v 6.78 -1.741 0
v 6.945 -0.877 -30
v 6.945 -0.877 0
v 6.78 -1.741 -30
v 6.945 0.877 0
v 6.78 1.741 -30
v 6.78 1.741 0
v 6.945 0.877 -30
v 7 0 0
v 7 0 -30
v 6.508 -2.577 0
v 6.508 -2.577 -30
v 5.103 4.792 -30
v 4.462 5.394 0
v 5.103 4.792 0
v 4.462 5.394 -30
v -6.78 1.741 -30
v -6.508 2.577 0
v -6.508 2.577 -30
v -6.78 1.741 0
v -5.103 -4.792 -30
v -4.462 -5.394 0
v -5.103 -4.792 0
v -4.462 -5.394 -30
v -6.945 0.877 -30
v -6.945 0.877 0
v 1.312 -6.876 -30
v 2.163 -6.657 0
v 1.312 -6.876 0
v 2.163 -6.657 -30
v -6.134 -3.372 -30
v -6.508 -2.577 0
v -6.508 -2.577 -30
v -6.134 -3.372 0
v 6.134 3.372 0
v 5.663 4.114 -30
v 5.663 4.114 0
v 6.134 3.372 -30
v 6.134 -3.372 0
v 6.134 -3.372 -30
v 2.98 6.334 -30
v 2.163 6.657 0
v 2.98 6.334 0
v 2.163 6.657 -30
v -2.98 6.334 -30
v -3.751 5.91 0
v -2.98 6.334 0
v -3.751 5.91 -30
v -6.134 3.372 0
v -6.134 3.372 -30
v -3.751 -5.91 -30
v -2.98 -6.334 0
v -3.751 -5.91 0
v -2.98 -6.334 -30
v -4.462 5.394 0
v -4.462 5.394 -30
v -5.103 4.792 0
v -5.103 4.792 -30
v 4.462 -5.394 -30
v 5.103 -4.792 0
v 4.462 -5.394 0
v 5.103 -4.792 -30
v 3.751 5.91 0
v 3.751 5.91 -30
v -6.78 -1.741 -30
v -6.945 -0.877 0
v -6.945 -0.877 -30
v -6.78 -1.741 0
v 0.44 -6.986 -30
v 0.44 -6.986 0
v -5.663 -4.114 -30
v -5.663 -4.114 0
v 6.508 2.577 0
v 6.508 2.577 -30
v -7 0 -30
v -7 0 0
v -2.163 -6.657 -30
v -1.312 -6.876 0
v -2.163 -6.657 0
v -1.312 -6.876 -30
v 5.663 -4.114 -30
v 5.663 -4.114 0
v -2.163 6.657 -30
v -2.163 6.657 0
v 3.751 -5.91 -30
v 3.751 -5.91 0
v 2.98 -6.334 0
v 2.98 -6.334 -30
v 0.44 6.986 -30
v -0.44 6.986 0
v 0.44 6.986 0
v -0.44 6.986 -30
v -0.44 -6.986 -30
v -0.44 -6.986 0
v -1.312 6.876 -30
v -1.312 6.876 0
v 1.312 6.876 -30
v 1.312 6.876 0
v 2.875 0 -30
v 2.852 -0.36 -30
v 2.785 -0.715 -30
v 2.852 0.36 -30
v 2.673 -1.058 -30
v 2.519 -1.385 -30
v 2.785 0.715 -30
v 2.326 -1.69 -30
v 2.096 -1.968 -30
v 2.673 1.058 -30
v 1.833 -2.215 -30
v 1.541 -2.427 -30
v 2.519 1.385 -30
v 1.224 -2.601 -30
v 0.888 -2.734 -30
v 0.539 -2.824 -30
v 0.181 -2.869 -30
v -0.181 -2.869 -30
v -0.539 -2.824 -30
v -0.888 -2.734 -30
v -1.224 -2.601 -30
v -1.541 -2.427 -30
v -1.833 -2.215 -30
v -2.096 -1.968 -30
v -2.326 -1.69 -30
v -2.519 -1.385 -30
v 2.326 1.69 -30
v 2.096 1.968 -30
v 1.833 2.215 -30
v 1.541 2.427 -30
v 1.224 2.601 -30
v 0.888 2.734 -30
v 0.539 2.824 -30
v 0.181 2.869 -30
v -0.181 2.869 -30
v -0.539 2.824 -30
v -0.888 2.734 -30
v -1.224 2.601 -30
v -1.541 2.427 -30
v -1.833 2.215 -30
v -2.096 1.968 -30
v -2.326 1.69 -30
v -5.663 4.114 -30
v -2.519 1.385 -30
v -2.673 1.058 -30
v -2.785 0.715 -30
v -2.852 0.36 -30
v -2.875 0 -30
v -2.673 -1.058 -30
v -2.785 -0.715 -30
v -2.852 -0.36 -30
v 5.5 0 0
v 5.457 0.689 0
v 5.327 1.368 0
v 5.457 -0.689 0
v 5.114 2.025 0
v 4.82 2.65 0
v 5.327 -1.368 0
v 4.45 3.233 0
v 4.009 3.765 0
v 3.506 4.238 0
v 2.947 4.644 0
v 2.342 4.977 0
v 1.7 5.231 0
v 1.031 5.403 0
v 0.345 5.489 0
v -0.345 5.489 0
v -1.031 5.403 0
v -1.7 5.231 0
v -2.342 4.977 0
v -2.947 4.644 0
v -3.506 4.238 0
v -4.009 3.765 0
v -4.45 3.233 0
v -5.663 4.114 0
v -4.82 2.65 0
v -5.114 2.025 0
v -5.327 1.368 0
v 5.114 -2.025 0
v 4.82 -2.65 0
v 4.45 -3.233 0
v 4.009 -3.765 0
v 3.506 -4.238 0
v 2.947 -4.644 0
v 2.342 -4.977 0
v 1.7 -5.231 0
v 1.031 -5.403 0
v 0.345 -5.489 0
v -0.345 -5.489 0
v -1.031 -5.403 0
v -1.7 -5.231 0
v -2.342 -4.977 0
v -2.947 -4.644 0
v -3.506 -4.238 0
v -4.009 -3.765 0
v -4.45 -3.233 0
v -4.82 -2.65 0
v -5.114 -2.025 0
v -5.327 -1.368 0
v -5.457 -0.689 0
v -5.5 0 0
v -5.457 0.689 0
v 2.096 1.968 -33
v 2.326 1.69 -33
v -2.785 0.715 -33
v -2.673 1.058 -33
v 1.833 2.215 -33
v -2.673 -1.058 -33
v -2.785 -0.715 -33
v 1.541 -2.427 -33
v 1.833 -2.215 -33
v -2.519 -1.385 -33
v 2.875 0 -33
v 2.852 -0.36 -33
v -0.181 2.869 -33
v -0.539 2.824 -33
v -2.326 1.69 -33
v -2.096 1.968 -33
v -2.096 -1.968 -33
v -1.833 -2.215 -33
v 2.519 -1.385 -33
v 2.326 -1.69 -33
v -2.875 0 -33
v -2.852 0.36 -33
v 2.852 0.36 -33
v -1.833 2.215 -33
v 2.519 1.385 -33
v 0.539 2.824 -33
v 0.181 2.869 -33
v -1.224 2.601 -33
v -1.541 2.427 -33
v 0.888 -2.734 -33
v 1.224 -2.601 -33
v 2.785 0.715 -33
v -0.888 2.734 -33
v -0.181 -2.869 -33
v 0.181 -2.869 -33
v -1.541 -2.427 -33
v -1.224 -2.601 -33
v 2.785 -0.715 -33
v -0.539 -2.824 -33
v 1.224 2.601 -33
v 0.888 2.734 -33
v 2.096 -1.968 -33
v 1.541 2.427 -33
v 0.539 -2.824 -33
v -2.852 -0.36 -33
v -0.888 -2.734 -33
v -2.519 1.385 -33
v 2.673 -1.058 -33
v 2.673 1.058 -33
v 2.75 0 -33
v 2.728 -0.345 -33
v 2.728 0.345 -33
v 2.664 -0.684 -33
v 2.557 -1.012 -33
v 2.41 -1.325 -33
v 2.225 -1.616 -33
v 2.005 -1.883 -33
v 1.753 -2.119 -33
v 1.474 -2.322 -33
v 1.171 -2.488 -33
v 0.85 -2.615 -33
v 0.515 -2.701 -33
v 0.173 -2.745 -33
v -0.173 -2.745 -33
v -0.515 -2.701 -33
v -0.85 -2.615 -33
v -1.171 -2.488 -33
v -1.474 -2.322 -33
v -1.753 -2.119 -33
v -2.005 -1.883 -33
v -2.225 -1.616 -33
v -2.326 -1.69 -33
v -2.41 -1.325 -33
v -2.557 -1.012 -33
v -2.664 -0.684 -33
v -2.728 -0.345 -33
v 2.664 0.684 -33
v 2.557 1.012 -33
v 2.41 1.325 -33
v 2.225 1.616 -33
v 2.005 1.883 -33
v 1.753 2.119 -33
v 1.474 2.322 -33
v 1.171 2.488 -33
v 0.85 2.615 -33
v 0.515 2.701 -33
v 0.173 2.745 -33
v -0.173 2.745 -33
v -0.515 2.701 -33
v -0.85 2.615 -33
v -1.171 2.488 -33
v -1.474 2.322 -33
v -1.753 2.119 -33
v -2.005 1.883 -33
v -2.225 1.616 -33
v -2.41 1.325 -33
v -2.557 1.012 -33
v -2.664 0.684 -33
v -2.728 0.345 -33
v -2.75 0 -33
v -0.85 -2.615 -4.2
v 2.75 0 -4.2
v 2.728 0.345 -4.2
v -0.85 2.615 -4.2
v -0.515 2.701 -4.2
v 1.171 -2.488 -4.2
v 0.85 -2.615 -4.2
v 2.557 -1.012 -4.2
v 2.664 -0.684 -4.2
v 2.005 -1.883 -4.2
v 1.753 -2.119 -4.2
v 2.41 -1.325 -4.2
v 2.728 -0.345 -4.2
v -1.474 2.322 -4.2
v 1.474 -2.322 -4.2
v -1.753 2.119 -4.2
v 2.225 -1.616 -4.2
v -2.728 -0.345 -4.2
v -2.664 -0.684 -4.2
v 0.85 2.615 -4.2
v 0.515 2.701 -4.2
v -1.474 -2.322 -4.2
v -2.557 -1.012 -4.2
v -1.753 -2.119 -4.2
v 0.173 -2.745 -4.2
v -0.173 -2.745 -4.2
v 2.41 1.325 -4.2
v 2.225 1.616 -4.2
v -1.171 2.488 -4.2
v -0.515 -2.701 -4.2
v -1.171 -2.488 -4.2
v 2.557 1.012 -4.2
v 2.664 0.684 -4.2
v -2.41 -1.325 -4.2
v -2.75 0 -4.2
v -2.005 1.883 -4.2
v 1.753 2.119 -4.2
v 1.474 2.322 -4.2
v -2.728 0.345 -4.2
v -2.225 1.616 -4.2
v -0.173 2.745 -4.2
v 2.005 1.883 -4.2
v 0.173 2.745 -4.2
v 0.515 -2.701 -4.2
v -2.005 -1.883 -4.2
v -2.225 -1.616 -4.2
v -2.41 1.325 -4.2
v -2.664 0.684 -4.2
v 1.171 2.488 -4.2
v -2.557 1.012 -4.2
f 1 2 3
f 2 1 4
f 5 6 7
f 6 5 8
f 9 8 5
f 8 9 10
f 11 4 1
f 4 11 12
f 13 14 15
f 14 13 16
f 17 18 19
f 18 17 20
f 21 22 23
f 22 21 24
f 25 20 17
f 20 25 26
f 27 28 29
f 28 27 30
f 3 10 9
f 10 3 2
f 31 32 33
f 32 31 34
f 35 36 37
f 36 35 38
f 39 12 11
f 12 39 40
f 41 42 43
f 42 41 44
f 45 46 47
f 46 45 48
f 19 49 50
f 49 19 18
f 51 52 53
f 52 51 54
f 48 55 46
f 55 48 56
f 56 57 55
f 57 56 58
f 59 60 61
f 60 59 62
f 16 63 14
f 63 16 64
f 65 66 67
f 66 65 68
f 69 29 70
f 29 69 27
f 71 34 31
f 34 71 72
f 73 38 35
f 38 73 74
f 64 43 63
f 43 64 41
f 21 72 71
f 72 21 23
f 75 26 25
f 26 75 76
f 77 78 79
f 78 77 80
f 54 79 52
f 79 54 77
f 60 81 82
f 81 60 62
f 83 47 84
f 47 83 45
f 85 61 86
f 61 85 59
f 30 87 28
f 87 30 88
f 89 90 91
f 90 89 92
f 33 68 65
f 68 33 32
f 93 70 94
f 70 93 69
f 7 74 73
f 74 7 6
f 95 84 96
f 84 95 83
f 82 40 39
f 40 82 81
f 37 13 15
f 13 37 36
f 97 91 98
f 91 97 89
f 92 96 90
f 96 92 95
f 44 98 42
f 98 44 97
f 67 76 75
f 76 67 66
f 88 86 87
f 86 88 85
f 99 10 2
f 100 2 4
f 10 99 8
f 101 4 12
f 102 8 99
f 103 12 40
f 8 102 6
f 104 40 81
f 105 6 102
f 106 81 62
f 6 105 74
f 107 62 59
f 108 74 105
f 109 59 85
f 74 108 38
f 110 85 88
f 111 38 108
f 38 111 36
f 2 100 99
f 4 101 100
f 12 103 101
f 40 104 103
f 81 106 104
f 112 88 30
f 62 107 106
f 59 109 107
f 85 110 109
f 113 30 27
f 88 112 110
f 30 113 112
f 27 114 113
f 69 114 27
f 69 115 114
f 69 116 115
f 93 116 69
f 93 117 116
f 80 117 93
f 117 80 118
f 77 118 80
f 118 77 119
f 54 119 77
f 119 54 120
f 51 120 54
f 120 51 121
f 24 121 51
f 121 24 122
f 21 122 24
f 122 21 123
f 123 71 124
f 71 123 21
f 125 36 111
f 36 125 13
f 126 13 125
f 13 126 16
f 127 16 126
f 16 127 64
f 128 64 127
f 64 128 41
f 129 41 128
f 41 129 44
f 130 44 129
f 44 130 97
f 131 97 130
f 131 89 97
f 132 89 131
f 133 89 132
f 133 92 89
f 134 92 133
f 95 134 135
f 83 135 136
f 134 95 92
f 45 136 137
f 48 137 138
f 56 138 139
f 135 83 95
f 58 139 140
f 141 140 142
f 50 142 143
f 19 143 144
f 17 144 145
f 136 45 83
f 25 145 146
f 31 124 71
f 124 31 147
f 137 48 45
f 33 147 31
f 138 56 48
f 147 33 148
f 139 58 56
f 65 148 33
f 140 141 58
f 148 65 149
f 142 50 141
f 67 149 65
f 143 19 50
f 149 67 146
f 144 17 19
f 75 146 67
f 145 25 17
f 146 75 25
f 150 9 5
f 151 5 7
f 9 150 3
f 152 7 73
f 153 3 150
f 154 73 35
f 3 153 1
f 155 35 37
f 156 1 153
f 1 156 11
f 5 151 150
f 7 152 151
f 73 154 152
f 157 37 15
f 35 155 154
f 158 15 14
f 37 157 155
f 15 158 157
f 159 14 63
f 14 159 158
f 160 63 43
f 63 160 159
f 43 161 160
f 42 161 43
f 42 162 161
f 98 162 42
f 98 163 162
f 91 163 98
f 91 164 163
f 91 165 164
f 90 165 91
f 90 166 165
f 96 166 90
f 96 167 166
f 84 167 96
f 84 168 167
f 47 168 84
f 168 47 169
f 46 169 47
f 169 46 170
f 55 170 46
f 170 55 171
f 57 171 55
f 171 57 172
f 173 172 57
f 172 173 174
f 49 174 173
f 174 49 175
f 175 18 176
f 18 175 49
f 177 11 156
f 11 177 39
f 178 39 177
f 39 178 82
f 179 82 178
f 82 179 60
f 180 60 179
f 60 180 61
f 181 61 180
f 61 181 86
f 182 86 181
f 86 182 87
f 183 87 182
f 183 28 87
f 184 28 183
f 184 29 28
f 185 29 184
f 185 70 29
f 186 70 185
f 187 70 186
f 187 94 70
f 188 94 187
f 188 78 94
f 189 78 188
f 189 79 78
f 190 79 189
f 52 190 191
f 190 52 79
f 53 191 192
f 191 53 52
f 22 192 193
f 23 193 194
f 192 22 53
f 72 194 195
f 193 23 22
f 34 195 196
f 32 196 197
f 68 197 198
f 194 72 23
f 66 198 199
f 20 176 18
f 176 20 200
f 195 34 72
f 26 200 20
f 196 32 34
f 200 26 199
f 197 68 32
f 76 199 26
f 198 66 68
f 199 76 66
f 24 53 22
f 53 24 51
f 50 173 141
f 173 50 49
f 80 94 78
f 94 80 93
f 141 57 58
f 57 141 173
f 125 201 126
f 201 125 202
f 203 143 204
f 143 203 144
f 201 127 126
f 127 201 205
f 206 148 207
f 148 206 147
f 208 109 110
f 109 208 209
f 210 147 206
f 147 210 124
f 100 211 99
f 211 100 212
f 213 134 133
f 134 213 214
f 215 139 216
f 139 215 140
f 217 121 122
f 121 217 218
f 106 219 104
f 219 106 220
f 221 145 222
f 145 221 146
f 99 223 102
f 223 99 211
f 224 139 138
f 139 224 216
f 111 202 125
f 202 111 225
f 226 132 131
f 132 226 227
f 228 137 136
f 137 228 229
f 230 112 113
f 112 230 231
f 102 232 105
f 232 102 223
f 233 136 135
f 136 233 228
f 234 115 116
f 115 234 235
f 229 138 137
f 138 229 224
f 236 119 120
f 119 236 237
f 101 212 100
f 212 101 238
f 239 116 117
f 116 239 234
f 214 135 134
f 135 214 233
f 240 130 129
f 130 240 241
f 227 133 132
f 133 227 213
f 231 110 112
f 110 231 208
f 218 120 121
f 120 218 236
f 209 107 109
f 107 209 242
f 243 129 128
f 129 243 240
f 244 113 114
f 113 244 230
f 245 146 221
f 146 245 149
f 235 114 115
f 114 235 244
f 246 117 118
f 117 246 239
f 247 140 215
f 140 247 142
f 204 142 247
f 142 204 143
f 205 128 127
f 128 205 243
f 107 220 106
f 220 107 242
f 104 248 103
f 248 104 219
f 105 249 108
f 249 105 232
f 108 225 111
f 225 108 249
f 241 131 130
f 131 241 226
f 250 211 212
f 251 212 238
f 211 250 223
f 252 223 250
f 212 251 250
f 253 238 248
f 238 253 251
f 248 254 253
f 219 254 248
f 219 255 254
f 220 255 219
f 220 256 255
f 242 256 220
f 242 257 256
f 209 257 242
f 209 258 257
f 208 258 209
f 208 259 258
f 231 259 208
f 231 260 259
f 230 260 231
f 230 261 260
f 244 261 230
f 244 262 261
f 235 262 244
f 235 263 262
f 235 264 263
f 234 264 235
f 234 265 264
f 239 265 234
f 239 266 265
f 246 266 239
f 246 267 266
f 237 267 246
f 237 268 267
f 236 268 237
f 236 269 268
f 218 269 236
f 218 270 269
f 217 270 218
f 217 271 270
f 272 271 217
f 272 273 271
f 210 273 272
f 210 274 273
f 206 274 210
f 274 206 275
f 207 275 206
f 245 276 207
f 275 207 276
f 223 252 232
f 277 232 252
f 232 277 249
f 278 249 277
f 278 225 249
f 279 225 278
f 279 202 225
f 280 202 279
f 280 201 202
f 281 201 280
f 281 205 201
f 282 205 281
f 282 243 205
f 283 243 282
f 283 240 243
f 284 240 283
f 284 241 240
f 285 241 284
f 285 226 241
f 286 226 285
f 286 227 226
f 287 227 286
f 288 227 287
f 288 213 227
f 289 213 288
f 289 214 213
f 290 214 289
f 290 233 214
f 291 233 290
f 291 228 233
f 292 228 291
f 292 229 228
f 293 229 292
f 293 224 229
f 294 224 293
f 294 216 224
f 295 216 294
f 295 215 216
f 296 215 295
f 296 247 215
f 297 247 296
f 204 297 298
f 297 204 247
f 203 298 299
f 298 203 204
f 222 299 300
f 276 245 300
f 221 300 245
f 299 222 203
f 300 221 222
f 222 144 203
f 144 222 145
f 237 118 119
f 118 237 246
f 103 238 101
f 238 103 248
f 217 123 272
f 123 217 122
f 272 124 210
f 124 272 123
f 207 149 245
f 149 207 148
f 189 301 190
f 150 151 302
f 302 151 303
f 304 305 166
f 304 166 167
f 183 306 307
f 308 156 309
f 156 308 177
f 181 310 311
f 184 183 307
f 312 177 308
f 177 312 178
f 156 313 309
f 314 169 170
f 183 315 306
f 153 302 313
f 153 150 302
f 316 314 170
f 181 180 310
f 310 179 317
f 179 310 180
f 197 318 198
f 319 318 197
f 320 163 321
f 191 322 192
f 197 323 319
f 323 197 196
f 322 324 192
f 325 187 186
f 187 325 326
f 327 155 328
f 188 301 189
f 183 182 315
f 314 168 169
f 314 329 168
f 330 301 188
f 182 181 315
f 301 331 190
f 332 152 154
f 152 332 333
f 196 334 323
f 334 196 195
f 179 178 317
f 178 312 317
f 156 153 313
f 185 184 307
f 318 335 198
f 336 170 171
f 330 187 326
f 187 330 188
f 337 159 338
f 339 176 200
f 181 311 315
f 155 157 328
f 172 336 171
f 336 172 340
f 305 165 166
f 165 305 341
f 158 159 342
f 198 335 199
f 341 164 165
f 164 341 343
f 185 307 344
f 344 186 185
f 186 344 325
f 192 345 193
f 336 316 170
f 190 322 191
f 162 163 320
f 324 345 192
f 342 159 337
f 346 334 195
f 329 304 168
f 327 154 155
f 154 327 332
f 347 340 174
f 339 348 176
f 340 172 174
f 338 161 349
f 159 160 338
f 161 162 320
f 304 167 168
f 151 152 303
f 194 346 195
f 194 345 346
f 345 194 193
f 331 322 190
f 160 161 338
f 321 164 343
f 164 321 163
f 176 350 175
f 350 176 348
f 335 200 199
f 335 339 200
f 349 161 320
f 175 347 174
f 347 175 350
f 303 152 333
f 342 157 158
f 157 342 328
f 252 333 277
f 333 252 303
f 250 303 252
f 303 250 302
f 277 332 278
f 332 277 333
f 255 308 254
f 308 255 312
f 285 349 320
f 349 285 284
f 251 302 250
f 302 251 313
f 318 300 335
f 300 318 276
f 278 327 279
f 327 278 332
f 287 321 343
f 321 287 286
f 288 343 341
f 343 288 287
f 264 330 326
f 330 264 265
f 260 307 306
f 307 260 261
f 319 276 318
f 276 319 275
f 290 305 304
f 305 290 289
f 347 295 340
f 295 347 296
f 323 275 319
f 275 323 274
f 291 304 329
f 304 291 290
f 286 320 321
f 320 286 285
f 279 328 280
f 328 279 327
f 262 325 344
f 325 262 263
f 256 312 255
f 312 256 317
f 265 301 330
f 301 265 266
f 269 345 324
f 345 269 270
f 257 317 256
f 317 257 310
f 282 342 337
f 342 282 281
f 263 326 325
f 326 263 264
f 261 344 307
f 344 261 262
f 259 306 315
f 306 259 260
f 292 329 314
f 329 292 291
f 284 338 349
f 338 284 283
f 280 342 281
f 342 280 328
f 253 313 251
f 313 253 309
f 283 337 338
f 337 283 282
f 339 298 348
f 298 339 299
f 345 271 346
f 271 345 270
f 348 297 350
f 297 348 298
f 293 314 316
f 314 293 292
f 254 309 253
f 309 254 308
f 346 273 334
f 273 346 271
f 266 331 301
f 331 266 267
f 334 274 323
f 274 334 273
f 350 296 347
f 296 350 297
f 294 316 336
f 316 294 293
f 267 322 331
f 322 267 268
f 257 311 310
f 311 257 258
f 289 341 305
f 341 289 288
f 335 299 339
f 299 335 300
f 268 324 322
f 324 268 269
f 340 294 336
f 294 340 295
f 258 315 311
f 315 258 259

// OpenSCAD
$fn = 50;

difference() {
	union() {
		translate(v = [0, 0, -30.0]) {
			cylinder(h = 30, r = 7.0);
		}
		#translate(v = [0, 0, -33.0]) {
			cylinder(h = 33, r = 2.875);
		}
	}
	union() {
		translate(v = [0, 0, 0]) {
			rotate(a = [0, 0, 0]) {
				difference() {
					union() {
						translate(v = [0, 0, -33.0]) {
							cylinder(h = 33, r = 2.25);
						}
						translate(v = [0, 0, -4.2]) {
							cylinder(h = 4.2, r1 = 2.75, r2 = 5.5);
						}
						translate(v = [0, 0, -33.0]) {
							cylinder(h = 33, r = 2.75);
						}
						translate(v = [0, 0, -33.0]) {
							cylinder(h = 33, r = 2.25);
						}
					}
					union();
				}
			}
		}
	}
}
